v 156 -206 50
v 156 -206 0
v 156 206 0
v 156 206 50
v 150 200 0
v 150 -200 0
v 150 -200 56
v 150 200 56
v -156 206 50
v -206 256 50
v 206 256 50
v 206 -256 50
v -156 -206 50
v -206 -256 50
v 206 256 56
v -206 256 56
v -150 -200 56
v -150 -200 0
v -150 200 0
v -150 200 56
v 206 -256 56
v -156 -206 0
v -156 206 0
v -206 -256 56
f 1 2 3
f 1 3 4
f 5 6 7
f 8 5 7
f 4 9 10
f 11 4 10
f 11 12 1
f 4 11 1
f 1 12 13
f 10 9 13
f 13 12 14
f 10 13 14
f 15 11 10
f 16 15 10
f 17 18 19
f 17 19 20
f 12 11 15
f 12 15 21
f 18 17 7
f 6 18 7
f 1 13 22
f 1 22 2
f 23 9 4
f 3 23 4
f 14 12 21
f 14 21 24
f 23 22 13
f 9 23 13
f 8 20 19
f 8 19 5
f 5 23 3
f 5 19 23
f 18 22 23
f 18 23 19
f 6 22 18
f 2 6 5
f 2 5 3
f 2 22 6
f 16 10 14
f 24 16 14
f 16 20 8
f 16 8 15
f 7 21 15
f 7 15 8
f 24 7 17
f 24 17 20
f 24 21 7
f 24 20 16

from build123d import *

# Parameters (mm, degrees)
SKETCH051_W  = 300
SKETCH051_H  = 60
PAD010_DEPTH = 200
SKETCH052_W  = 312
SKETCH052_H  = 50
PAD011_DEPTH = 206
SKETCH053_W  = 412
SKETCH053_H  = 512
PAD012_DEPTH = 6


with BuildPart() as body008:
    # Sketch051 → Pad010 (new body, symmetric)
    with BuildSketch(Plane.XZ):
        with Locations((0, 30)):
            Rectangle(SKETCH051_W, SKETCH051_H)
    extrude(amount=PAD010_DEPTH, both=True)


with BuildPart() as cut006:
    # Sketch052 → Pad011 (new body, symmetric)
    with BuildSketch(Plane.XZ):
        with Locations((0, 25)):
            Rectangle(SKETCH052_W, SKETCH052_H)
    extrude(amount=PAD011_DEPTH, both=True)

    # Sketch053 (on Face3 of Pad011) → Pad012 (join)
    with BuildSketch(Plane(origin=(0, 0, 50), x_dir=(-1, 0, 0), z_dir=(0, 0, 1))):
        Rectangle(SKETCH053_W, SKETCH053_H)
    extrude(amount=PAD012_DEPTH)

    # Cut006: cut Body008
    add(body008.part, mode=Mode.SUBTRACT)


solid = cut006.part
